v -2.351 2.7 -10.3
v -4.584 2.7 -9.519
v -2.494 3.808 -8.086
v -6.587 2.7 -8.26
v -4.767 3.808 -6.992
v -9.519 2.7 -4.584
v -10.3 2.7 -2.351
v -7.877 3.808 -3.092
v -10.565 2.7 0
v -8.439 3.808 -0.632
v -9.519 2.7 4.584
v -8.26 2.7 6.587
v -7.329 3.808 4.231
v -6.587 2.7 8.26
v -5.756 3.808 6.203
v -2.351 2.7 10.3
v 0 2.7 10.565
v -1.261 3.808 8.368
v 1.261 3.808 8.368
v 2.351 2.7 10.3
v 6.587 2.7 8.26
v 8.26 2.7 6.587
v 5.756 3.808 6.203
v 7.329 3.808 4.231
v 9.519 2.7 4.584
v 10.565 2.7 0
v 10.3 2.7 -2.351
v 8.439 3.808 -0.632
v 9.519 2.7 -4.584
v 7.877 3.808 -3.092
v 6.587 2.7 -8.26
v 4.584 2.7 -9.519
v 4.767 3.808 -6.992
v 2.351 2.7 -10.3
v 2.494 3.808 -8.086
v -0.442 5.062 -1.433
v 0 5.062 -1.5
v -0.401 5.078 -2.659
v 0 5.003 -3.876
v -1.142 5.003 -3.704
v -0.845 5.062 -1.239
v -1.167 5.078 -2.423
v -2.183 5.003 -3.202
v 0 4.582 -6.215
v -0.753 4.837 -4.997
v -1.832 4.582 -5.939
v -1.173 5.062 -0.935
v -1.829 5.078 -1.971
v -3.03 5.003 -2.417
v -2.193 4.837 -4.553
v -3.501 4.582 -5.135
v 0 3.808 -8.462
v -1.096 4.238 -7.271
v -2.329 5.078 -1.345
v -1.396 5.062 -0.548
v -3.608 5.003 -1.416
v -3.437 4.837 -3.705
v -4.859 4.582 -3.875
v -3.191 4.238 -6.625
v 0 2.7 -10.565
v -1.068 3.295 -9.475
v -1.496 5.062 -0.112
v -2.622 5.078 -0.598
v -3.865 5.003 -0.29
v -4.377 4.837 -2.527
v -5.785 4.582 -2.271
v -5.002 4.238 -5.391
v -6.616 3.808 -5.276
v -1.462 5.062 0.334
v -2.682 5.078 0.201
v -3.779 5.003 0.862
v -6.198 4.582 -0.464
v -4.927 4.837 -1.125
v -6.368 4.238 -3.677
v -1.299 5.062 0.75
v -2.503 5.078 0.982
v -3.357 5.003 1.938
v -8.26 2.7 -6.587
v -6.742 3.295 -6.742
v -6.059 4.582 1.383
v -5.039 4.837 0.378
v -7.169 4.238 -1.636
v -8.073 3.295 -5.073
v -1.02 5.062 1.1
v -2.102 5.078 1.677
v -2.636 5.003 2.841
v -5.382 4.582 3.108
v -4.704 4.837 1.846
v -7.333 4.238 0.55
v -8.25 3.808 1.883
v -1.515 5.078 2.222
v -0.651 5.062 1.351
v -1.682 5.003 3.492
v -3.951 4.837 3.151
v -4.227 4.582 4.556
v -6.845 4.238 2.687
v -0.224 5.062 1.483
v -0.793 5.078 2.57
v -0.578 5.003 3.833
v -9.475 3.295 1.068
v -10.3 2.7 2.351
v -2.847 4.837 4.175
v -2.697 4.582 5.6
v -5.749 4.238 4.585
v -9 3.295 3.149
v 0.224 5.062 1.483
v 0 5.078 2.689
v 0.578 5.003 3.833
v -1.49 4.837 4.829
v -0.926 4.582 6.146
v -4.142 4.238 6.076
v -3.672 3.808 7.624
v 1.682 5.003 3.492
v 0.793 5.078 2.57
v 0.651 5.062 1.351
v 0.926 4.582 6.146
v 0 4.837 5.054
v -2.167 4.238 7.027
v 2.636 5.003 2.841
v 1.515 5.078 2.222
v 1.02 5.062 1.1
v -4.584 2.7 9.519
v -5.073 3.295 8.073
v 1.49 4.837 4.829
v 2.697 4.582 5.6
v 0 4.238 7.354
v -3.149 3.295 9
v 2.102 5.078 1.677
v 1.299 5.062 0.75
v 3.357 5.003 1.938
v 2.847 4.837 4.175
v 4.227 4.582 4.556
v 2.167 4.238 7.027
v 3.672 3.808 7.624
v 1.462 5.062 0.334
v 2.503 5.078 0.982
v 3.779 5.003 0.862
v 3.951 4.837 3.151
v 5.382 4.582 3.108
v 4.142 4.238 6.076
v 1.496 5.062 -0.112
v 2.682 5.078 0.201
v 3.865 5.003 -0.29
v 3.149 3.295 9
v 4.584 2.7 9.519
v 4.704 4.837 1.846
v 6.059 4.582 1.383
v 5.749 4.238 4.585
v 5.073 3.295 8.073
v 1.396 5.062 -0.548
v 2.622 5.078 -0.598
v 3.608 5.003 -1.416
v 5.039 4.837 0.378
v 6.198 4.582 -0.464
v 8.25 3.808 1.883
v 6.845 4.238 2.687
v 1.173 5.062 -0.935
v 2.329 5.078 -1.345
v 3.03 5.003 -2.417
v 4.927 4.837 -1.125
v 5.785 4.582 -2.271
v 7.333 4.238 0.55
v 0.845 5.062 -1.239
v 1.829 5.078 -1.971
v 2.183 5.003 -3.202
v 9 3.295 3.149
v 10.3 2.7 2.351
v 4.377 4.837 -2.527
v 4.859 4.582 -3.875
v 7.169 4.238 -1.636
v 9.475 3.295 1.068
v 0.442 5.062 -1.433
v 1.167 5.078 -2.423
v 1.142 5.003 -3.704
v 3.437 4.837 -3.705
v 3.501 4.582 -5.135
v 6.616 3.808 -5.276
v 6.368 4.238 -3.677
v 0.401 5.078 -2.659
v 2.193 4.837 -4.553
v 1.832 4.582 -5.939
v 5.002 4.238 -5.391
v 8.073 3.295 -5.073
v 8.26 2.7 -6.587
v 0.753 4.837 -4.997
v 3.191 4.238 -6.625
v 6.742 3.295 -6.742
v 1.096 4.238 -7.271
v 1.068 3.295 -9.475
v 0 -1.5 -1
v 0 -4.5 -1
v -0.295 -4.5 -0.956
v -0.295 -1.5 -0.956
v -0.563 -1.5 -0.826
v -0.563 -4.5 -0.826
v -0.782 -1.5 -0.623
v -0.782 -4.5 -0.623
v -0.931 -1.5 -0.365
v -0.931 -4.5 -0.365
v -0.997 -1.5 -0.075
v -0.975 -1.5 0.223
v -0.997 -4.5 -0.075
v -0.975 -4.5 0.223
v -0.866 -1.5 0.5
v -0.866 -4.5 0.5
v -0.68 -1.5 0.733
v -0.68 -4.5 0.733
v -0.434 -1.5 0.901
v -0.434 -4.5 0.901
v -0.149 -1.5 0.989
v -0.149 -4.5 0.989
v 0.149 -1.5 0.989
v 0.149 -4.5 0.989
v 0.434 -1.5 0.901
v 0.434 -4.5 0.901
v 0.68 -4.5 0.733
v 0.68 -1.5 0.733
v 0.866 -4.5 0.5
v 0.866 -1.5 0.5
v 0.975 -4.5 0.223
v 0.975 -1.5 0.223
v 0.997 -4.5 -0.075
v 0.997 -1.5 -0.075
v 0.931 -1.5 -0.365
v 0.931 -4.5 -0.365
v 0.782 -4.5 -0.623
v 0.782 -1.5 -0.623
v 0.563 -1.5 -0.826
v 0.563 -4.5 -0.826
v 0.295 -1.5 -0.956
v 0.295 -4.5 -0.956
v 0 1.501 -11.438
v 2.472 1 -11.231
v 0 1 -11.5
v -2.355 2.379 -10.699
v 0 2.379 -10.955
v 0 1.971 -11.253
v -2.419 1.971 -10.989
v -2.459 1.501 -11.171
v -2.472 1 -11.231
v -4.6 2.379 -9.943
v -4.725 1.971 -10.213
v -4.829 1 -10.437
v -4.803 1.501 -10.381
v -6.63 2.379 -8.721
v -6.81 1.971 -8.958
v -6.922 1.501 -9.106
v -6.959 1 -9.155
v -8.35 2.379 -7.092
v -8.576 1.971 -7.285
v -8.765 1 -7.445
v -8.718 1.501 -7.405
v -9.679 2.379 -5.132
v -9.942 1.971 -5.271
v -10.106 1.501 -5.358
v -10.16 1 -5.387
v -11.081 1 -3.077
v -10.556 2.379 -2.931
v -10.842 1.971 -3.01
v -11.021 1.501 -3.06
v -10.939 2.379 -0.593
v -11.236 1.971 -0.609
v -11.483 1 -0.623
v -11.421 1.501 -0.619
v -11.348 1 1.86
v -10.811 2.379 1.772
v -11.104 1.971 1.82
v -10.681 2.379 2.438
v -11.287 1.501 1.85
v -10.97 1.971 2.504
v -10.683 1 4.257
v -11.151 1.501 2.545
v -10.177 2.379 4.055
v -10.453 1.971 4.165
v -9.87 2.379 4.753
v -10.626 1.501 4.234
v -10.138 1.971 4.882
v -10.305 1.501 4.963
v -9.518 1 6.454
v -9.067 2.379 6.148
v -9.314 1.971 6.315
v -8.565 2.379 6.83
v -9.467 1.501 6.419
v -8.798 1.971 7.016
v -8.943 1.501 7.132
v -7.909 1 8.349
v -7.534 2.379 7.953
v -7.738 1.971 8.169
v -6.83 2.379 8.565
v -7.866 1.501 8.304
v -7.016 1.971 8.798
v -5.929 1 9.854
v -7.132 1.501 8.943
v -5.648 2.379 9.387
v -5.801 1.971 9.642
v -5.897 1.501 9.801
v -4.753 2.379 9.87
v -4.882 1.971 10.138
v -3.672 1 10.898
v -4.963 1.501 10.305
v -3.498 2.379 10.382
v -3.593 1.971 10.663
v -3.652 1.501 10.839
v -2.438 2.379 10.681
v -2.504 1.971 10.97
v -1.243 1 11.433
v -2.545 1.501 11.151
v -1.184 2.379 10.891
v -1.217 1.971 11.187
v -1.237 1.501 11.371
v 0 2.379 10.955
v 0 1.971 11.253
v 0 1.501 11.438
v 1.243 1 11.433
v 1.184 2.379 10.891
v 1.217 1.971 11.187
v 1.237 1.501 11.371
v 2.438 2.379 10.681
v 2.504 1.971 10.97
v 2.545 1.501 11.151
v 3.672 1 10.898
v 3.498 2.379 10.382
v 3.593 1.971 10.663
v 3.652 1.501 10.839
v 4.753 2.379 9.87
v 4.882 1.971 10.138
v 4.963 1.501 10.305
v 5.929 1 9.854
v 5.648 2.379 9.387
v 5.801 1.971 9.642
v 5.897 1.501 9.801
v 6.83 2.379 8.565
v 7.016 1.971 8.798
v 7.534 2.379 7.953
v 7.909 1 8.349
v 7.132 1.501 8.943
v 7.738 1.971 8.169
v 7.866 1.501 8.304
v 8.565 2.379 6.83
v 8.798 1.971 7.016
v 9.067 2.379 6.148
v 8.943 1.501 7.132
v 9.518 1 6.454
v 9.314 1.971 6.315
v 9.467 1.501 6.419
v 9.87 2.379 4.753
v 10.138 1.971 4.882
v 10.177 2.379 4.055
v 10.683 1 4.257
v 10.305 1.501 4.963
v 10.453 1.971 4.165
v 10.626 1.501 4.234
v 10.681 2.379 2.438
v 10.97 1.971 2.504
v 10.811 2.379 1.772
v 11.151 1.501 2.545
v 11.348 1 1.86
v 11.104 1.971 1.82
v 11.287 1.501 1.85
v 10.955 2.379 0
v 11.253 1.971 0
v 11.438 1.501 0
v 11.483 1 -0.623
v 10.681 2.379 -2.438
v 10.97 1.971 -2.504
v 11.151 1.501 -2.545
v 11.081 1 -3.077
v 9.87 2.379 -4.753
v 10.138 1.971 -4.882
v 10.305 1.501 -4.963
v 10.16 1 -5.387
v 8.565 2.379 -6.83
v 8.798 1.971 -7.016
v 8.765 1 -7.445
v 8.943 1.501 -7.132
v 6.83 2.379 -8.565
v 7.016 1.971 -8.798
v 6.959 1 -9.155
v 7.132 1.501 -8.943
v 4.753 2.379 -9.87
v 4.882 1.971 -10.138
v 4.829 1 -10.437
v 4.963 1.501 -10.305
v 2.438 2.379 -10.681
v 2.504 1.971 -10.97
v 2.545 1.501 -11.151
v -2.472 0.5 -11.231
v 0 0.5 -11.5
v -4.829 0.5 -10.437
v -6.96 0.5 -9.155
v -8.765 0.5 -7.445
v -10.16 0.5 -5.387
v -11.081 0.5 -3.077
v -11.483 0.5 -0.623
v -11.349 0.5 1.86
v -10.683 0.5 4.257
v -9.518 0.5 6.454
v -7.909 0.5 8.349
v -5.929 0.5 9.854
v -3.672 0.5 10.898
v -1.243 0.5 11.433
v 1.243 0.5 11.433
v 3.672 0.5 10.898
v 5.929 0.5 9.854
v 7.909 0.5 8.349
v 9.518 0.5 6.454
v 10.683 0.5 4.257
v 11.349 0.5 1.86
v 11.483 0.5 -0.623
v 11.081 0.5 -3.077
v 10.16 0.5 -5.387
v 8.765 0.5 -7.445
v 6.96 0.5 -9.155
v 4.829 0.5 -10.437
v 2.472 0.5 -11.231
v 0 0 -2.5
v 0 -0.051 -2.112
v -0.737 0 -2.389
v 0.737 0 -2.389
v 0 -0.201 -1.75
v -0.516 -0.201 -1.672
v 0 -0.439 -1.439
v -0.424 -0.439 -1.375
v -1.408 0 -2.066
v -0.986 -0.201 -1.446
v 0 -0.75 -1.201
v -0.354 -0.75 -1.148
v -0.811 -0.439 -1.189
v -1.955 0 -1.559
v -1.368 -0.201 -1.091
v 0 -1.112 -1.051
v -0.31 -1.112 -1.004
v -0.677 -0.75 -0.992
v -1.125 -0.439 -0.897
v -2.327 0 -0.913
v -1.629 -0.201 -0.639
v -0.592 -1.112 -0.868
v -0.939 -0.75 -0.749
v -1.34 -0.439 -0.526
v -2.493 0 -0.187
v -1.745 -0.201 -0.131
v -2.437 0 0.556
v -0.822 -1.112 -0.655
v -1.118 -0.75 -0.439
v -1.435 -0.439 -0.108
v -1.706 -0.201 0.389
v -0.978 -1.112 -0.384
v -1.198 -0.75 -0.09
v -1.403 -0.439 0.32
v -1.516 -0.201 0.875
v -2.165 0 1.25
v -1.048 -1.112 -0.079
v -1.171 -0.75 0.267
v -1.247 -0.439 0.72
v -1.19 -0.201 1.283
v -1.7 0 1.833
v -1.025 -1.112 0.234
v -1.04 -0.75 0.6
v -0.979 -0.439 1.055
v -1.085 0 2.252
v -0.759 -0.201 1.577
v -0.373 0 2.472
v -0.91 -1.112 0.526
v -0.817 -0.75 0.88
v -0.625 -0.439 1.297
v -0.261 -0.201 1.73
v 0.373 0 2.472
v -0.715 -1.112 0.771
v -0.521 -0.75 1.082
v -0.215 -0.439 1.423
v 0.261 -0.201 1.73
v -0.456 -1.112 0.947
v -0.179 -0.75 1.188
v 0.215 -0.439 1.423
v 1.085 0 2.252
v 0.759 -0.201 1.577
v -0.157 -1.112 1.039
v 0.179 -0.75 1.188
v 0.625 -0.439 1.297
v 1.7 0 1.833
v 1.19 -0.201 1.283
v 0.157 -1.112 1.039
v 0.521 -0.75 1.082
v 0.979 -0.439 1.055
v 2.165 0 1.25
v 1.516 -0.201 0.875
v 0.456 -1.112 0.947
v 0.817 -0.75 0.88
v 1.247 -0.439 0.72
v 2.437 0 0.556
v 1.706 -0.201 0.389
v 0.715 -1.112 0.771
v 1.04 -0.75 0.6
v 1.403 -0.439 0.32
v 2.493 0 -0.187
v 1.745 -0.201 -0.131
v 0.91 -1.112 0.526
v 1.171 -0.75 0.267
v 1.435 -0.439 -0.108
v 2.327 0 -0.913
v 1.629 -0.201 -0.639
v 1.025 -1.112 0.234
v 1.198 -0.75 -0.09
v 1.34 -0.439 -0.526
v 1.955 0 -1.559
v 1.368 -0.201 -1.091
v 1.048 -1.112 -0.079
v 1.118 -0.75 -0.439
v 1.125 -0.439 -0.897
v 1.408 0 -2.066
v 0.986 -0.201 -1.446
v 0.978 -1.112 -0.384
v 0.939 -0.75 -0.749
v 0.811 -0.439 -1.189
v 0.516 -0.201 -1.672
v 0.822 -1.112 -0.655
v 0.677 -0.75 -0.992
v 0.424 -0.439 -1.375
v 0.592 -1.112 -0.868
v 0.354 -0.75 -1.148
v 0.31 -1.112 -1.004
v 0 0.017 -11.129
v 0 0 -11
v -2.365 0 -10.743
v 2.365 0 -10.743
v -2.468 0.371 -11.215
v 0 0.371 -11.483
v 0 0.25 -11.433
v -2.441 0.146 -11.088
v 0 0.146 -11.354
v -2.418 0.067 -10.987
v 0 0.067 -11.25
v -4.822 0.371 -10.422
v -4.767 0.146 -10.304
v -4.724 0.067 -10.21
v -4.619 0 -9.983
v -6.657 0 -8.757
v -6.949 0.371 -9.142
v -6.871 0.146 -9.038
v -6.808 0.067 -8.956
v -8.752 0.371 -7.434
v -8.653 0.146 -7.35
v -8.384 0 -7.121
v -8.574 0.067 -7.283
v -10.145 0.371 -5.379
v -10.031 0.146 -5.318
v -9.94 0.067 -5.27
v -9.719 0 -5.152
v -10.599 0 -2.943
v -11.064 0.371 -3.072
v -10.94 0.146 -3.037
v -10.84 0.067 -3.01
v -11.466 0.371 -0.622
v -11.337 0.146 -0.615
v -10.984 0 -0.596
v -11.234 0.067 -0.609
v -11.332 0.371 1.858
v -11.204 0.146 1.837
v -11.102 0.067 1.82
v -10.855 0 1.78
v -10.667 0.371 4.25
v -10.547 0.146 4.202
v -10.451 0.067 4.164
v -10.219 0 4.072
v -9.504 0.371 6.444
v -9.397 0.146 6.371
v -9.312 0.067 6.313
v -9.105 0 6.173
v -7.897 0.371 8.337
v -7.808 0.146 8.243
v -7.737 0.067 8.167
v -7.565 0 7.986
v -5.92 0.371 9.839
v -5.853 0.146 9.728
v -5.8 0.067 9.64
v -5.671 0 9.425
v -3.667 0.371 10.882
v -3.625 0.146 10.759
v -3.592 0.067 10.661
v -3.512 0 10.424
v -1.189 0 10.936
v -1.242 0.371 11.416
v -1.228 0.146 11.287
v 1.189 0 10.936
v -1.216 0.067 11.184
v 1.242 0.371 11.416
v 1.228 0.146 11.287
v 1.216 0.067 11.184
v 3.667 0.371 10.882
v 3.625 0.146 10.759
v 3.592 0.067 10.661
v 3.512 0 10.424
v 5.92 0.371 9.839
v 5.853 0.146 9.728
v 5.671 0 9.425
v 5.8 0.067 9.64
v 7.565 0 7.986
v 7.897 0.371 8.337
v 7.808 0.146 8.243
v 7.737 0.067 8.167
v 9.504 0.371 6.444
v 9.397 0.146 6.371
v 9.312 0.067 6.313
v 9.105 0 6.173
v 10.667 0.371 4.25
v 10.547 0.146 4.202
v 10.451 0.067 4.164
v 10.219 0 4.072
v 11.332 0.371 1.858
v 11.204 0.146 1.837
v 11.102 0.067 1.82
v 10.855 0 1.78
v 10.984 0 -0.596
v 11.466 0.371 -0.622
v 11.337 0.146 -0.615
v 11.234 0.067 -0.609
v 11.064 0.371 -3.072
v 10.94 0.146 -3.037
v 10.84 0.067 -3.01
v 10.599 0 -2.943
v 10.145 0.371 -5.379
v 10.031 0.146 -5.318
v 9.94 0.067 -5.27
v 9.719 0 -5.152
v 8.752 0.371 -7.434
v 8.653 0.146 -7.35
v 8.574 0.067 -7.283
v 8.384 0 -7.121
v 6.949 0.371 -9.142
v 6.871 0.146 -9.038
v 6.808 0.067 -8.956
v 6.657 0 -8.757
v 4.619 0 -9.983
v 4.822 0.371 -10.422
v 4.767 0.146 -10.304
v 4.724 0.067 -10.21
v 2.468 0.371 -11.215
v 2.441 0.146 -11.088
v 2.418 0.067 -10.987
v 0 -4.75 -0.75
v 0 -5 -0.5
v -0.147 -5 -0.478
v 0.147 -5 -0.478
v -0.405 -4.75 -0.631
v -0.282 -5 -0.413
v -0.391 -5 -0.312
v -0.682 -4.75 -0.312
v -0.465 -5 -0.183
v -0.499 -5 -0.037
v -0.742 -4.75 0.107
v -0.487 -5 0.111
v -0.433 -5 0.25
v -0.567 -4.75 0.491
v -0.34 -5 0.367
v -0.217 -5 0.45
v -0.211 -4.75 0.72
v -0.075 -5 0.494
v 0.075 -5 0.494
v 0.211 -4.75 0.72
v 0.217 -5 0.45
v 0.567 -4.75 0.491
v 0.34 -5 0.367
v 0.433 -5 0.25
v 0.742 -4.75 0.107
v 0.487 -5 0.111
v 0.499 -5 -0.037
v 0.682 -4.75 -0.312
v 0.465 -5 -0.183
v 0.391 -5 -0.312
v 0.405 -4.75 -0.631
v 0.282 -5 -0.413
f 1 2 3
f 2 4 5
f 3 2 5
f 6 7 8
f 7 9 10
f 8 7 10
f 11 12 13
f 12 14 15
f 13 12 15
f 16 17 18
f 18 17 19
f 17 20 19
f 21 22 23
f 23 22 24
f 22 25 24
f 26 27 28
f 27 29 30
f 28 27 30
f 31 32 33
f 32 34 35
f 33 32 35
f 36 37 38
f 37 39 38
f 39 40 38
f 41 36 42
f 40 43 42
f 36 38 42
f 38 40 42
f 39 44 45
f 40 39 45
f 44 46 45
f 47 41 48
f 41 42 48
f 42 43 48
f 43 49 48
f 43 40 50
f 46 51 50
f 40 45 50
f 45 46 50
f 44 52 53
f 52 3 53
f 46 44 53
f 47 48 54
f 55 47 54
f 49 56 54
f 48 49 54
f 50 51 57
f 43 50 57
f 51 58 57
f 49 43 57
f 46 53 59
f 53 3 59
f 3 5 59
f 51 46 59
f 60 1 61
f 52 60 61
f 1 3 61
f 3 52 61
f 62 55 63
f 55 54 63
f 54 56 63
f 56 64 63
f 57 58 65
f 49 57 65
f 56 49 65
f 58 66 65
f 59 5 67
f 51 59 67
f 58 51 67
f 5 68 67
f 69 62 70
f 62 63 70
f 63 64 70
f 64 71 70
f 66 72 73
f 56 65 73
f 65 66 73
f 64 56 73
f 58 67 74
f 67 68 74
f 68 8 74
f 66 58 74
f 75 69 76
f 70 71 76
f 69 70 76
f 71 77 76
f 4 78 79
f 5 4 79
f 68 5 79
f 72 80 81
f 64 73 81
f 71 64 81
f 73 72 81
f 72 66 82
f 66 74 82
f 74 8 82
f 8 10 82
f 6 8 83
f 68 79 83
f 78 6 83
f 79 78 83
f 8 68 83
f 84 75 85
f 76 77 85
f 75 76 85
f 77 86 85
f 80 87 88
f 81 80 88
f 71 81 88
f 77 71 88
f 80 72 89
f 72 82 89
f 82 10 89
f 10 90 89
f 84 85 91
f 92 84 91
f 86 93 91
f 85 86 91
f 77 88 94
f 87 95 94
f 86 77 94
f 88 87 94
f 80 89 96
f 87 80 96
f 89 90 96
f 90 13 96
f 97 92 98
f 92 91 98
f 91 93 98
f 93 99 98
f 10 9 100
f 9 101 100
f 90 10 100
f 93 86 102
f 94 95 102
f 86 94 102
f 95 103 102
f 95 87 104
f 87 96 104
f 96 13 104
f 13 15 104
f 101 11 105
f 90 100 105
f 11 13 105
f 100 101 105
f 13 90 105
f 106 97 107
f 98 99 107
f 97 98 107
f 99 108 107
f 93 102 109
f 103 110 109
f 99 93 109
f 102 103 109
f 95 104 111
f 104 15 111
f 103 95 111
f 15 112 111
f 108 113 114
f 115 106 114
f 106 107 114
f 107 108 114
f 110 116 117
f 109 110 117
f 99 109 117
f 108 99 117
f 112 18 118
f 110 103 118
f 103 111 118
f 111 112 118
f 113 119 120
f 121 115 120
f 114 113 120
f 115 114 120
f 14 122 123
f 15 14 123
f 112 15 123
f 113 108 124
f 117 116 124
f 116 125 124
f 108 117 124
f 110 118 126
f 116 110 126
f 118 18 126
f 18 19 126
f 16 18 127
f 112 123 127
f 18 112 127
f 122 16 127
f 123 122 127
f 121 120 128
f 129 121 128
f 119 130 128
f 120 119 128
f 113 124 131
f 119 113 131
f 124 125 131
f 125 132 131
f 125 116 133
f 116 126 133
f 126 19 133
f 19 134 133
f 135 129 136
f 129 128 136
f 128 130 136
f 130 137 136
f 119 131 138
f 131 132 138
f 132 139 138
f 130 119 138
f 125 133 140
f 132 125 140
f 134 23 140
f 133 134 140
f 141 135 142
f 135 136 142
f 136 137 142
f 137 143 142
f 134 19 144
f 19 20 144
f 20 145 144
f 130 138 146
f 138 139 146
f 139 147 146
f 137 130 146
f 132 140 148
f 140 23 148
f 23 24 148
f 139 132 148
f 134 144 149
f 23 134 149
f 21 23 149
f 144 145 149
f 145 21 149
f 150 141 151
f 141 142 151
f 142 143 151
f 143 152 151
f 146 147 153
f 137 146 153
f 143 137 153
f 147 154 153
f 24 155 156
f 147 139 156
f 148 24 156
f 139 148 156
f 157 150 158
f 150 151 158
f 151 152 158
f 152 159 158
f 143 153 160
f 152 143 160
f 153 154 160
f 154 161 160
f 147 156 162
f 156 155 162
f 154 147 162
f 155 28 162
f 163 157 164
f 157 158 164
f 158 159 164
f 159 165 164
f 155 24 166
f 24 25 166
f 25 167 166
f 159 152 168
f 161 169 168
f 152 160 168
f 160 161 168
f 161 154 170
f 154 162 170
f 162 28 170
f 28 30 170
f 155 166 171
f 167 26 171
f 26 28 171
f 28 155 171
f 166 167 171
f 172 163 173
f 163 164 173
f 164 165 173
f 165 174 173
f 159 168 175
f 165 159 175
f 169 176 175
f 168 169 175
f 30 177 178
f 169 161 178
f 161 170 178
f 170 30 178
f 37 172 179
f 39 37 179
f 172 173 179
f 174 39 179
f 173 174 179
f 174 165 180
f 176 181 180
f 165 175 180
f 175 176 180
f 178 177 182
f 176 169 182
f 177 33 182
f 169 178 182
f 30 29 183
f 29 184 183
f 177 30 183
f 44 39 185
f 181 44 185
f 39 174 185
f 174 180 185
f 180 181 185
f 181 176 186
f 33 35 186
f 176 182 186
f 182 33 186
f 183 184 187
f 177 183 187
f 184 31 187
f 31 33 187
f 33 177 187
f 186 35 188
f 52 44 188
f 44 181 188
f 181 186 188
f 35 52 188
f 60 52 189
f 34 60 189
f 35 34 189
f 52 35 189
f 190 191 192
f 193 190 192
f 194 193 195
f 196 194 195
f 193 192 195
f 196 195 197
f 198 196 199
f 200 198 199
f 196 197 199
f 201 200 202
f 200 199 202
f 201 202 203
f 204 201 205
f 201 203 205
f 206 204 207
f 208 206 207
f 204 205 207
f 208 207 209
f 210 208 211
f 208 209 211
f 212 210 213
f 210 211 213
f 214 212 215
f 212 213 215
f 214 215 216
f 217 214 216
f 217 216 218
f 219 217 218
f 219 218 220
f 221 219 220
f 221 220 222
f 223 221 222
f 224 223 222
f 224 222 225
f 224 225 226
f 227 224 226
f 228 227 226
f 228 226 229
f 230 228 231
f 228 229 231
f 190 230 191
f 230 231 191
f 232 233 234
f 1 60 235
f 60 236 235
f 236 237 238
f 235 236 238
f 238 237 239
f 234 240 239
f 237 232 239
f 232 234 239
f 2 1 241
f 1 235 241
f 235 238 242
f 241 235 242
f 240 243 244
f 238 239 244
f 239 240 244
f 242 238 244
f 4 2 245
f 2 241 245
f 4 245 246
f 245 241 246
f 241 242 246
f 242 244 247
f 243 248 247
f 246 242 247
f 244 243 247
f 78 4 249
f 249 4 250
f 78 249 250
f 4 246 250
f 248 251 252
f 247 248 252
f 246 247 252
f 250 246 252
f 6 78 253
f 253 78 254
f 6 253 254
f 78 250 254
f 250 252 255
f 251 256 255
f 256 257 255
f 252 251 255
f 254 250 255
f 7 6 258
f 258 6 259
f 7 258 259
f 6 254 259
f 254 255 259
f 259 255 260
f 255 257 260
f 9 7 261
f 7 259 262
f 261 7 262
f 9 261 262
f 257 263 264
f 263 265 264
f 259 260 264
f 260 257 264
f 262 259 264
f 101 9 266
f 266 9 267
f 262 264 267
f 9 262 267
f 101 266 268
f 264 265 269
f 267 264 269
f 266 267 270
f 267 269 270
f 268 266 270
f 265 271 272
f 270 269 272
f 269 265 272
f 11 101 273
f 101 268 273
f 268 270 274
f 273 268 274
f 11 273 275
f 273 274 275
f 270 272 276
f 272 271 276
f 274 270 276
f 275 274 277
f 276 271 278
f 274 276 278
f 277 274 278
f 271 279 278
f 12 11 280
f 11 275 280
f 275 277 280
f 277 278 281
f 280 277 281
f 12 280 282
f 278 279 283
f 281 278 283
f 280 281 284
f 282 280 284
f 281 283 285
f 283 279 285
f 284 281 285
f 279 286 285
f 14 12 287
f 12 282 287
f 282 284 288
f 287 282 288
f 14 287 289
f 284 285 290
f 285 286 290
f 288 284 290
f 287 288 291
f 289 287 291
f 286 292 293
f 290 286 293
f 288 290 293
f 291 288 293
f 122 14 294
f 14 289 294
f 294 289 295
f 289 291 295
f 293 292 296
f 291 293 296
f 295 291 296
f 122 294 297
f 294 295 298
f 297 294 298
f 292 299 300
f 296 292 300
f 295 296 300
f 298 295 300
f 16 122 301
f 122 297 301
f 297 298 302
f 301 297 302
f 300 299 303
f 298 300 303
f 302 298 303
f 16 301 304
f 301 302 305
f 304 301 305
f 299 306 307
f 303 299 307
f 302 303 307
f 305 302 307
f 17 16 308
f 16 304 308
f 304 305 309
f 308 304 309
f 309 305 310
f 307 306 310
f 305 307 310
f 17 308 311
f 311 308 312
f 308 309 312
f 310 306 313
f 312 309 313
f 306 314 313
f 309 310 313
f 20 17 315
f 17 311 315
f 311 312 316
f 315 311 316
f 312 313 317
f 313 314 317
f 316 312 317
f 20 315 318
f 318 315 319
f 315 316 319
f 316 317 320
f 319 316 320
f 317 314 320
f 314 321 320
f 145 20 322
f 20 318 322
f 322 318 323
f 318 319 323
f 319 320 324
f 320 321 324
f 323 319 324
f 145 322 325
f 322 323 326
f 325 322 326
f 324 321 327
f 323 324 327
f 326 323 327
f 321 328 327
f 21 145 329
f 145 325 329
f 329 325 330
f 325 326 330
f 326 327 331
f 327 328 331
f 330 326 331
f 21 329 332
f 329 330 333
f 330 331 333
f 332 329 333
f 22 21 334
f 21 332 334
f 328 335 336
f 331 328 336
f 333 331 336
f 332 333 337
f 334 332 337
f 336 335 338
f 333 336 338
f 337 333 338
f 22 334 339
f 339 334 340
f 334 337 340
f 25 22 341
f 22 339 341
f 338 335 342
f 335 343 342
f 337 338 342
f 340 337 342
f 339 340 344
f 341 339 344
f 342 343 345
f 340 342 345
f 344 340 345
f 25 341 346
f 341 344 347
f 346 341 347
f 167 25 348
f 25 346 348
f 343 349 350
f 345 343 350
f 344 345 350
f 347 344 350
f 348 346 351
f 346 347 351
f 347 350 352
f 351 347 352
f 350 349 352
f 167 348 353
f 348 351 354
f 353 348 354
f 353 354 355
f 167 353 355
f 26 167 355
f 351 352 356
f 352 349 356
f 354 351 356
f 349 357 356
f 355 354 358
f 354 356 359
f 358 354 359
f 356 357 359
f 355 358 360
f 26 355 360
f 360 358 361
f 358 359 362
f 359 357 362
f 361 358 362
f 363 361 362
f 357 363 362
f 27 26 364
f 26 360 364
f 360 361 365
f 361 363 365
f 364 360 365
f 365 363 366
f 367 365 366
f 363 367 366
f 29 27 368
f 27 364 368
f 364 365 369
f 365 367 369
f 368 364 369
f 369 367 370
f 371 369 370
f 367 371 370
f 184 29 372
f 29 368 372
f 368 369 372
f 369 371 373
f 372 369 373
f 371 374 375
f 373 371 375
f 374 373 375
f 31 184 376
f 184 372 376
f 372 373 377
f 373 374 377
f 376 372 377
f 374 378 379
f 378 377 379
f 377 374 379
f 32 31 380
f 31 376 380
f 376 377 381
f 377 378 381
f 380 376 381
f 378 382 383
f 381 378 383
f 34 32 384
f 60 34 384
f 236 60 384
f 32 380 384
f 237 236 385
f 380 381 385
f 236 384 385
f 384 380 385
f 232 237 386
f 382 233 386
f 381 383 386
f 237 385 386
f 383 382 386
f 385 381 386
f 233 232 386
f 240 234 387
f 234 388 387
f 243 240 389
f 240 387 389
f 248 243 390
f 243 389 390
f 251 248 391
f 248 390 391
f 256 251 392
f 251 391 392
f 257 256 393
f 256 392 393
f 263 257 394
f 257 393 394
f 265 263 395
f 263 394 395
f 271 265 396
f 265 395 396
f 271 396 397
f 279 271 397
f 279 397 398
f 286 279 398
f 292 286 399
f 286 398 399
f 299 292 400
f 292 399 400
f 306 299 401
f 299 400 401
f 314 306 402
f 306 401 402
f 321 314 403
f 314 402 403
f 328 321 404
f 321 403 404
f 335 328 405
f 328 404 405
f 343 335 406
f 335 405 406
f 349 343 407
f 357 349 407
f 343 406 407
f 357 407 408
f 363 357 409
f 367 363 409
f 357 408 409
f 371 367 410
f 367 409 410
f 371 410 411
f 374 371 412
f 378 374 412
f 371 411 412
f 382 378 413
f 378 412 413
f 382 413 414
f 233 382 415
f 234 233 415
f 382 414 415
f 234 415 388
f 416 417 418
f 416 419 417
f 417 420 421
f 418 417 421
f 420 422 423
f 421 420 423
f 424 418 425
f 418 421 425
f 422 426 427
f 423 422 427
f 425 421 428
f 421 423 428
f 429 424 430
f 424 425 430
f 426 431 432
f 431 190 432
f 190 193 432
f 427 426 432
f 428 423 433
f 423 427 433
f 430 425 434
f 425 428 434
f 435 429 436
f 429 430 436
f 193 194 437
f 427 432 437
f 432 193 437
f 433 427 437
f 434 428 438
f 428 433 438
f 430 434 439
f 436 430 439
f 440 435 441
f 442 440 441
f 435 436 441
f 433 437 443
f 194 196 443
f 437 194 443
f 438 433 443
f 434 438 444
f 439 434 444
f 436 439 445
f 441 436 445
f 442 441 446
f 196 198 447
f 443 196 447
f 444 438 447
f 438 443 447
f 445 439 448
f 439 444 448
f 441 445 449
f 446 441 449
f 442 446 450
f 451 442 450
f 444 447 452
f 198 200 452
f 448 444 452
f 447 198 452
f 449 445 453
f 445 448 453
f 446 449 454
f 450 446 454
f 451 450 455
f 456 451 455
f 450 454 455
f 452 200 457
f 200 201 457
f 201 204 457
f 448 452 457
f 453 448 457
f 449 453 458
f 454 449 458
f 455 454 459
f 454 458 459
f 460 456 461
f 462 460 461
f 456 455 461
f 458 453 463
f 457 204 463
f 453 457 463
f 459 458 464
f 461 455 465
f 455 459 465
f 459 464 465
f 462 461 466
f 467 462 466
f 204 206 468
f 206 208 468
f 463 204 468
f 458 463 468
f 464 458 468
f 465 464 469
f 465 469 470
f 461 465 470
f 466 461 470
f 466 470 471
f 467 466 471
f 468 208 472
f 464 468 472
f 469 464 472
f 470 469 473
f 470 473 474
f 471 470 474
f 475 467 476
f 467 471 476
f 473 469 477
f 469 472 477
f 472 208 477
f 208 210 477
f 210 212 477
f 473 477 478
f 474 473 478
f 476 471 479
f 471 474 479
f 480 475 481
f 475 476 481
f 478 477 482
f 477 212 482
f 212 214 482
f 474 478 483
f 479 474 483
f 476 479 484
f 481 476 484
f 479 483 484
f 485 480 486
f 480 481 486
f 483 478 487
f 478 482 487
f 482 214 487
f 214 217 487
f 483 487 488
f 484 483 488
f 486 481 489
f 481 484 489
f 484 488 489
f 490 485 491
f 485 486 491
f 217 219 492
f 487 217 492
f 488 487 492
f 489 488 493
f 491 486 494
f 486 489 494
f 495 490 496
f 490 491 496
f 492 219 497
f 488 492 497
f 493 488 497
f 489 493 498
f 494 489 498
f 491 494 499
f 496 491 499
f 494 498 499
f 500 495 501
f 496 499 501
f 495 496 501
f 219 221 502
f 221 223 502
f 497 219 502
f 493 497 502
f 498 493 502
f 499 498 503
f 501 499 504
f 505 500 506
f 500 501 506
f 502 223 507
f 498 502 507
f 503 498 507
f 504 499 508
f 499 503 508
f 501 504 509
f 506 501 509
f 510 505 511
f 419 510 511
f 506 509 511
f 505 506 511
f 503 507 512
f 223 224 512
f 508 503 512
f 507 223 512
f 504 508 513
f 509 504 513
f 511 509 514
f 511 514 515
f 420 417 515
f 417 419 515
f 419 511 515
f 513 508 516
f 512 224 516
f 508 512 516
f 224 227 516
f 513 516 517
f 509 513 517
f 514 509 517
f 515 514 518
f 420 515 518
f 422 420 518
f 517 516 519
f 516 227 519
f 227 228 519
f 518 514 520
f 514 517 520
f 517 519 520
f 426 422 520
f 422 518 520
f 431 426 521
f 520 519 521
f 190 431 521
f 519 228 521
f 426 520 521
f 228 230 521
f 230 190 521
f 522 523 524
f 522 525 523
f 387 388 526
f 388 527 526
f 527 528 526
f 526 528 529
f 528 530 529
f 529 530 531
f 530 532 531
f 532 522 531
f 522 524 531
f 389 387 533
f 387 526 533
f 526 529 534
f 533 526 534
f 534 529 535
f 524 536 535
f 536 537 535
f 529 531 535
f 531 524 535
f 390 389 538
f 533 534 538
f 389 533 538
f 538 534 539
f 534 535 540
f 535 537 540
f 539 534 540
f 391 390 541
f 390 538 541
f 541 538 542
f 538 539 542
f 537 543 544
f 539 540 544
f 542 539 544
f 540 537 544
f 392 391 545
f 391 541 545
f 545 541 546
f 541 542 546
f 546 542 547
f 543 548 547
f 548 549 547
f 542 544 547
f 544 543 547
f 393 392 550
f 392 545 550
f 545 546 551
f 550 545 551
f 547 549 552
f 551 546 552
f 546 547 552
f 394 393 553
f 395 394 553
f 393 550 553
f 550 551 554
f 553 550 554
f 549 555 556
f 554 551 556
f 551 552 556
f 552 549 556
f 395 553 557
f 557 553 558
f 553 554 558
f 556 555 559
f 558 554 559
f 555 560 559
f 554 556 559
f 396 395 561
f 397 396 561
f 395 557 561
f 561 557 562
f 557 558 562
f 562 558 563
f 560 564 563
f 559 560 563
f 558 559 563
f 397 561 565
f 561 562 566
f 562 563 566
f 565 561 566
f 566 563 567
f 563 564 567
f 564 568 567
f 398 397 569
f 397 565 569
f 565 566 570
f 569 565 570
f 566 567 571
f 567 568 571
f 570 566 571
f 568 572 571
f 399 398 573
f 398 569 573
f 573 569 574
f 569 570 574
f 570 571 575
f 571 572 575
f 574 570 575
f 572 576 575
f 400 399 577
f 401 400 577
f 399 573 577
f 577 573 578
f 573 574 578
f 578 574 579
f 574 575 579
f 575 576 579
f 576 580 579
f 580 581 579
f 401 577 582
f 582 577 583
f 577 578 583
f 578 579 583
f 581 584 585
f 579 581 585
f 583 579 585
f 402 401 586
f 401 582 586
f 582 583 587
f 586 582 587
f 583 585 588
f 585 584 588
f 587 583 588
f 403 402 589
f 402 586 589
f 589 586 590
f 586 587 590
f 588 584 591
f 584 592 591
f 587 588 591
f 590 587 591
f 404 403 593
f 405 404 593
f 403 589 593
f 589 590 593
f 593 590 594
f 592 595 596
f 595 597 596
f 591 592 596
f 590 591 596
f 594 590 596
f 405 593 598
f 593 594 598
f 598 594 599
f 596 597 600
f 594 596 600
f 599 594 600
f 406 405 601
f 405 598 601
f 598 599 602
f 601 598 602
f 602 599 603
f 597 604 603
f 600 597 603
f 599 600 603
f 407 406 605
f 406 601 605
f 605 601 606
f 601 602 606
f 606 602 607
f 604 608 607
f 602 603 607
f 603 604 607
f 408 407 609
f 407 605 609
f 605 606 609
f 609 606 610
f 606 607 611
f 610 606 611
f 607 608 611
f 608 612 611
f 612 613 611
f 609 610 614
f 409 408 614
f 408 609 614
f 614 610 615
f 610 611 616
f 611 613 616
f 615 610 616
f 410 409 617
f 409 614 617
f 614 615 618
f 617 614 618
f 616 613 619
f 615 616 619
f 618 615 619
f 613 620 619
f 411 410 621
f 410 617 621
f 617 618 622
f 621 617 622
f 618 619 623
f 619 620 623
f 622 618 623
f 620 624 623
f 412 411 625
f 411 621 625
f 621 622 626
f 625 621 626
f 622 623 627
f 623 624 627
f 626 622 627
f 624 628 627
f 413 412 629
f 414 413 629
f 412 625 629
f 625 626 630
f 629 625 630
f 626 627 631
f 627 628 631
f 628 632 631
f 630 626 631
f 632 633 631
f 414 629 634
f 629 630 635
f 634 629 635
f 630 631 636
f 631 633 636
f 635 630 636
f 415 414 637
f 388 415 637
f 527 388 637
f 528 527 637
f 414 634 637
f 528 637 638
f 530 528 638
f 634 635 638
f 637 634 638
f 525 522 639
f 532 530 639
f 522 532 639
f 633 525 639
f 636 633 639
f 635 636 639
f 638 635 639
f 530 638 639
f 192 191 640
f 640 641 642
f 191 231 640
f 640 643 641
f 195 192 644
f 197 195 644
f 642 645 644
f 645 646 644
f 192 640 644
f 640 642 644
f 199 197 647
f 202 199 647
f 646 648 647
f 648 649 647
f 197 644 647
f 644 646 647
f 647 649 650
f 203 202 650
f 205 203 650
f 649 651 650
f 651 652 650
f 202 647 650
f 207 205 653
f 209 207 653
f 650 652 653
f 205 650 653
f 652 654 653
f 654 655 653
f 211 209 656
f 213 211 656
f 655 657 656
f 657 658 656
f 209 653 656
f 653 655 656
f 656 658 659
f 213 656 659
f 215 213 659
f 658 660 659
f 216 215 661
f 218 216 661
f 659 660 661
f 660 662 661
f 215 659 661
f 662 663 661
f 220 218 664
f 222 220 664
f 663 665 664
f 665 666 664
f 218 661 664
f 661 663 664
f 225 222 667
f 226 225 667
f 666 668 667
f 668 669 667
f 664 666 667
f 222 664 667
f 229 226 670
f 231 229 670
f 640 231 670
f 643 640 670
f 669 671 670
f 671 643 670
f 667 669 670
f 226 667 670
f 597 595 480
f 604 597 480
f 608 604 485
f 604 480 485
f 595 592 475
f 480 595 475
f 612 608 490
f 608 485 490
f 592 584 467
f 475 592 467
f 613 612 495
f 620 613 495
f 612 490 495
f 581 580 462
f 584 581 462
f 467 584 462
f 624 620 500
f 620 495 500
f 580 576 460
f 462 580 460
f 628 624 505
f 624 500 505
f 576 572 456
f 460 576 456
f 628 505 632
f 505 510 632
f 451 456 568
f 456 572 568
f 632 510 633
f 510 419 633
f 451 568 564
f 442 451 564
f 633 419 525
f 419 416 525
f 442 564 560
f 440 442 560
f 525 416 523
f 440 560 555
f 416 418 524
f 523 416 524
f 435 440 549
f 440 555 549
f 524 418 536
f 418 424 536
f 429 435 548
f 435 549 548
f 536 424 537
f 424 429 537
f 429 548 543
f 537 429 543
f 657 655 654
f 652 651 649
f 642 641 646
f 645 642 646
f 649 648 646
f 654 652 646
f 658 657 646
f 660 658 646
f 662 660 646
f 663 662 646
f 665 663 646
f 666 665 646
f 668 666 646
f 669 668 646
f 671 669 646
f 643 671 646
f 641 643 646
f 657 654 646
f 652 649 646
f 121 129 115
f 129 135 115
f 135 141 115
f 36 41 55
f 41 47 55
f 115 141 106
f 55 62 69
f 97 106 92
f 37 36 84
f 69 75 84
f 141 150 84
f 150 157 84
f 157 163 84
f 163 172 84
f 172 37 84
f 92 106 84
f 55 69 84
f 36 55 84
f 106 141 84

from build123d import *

# Parameters (mm, degrees)
FILLET1_R     = 1.5
CHAMFER1_SIZE = 0.5


with BuildPart() as part:
    # Sketch1 → Revolve1 (revolve)
    with BuildSketch(Plane.XY, mode=Mode.PRIVATE) as revolve1_sk:
        with BuildLine():
            Line((-11.000013874, -2.81e-07), (-1, -2.81e-07))
            Line((-1, -2.81e-07), (-1, -5.000000281))
            Line((-1, -5.000000281), (0, -5.000000281))
            Line((0, -5.000000281), (0, 5.06243))
            Line((0, 5.06243), (-1.5, 5.06243))
            ThreePointArc((-1.5, 5.06243), (-6.215053401, 4.581844183), (-10.565043576, 2.700281861))
            ThreePointArc((-10.565043576, 2.700281861), (-11.252524354, 1.971118503), (-11.499986126, 0.999999718))
            Line((-11.499986126, 0.999999718), (-11.5, 0.499999719))
            ThreePointArc((-11.5, 0.499999719), (-11.353562359, 0.14644717), (-11.000013874, -2.81e-07))
        make_face()
    revolve(revolve1_sk.sketch.rotate(Axis((0, 0, 0), (0, 1, 0)), 270), axis=Axis((0, 0, 0), (0, 1, 0)))

    # Fillet1
    fillet1_edges = [part.edges().sort_by_distance(p)[0] for p in [
        (0, -2.813517580805419e-07, 1.0),
    ]]
    fillet(fillet1_edges, radius=FILLET1_R)

    # Chamfer1
    chamfer1_edges = [part.edges().sort_by_distance(p)[0] for p in [
        (0, -5.000000281, 1),
    ]]
    chamfer(chamfer1_edges, length=CHAMFER1_SIZE)


solid = part.part
